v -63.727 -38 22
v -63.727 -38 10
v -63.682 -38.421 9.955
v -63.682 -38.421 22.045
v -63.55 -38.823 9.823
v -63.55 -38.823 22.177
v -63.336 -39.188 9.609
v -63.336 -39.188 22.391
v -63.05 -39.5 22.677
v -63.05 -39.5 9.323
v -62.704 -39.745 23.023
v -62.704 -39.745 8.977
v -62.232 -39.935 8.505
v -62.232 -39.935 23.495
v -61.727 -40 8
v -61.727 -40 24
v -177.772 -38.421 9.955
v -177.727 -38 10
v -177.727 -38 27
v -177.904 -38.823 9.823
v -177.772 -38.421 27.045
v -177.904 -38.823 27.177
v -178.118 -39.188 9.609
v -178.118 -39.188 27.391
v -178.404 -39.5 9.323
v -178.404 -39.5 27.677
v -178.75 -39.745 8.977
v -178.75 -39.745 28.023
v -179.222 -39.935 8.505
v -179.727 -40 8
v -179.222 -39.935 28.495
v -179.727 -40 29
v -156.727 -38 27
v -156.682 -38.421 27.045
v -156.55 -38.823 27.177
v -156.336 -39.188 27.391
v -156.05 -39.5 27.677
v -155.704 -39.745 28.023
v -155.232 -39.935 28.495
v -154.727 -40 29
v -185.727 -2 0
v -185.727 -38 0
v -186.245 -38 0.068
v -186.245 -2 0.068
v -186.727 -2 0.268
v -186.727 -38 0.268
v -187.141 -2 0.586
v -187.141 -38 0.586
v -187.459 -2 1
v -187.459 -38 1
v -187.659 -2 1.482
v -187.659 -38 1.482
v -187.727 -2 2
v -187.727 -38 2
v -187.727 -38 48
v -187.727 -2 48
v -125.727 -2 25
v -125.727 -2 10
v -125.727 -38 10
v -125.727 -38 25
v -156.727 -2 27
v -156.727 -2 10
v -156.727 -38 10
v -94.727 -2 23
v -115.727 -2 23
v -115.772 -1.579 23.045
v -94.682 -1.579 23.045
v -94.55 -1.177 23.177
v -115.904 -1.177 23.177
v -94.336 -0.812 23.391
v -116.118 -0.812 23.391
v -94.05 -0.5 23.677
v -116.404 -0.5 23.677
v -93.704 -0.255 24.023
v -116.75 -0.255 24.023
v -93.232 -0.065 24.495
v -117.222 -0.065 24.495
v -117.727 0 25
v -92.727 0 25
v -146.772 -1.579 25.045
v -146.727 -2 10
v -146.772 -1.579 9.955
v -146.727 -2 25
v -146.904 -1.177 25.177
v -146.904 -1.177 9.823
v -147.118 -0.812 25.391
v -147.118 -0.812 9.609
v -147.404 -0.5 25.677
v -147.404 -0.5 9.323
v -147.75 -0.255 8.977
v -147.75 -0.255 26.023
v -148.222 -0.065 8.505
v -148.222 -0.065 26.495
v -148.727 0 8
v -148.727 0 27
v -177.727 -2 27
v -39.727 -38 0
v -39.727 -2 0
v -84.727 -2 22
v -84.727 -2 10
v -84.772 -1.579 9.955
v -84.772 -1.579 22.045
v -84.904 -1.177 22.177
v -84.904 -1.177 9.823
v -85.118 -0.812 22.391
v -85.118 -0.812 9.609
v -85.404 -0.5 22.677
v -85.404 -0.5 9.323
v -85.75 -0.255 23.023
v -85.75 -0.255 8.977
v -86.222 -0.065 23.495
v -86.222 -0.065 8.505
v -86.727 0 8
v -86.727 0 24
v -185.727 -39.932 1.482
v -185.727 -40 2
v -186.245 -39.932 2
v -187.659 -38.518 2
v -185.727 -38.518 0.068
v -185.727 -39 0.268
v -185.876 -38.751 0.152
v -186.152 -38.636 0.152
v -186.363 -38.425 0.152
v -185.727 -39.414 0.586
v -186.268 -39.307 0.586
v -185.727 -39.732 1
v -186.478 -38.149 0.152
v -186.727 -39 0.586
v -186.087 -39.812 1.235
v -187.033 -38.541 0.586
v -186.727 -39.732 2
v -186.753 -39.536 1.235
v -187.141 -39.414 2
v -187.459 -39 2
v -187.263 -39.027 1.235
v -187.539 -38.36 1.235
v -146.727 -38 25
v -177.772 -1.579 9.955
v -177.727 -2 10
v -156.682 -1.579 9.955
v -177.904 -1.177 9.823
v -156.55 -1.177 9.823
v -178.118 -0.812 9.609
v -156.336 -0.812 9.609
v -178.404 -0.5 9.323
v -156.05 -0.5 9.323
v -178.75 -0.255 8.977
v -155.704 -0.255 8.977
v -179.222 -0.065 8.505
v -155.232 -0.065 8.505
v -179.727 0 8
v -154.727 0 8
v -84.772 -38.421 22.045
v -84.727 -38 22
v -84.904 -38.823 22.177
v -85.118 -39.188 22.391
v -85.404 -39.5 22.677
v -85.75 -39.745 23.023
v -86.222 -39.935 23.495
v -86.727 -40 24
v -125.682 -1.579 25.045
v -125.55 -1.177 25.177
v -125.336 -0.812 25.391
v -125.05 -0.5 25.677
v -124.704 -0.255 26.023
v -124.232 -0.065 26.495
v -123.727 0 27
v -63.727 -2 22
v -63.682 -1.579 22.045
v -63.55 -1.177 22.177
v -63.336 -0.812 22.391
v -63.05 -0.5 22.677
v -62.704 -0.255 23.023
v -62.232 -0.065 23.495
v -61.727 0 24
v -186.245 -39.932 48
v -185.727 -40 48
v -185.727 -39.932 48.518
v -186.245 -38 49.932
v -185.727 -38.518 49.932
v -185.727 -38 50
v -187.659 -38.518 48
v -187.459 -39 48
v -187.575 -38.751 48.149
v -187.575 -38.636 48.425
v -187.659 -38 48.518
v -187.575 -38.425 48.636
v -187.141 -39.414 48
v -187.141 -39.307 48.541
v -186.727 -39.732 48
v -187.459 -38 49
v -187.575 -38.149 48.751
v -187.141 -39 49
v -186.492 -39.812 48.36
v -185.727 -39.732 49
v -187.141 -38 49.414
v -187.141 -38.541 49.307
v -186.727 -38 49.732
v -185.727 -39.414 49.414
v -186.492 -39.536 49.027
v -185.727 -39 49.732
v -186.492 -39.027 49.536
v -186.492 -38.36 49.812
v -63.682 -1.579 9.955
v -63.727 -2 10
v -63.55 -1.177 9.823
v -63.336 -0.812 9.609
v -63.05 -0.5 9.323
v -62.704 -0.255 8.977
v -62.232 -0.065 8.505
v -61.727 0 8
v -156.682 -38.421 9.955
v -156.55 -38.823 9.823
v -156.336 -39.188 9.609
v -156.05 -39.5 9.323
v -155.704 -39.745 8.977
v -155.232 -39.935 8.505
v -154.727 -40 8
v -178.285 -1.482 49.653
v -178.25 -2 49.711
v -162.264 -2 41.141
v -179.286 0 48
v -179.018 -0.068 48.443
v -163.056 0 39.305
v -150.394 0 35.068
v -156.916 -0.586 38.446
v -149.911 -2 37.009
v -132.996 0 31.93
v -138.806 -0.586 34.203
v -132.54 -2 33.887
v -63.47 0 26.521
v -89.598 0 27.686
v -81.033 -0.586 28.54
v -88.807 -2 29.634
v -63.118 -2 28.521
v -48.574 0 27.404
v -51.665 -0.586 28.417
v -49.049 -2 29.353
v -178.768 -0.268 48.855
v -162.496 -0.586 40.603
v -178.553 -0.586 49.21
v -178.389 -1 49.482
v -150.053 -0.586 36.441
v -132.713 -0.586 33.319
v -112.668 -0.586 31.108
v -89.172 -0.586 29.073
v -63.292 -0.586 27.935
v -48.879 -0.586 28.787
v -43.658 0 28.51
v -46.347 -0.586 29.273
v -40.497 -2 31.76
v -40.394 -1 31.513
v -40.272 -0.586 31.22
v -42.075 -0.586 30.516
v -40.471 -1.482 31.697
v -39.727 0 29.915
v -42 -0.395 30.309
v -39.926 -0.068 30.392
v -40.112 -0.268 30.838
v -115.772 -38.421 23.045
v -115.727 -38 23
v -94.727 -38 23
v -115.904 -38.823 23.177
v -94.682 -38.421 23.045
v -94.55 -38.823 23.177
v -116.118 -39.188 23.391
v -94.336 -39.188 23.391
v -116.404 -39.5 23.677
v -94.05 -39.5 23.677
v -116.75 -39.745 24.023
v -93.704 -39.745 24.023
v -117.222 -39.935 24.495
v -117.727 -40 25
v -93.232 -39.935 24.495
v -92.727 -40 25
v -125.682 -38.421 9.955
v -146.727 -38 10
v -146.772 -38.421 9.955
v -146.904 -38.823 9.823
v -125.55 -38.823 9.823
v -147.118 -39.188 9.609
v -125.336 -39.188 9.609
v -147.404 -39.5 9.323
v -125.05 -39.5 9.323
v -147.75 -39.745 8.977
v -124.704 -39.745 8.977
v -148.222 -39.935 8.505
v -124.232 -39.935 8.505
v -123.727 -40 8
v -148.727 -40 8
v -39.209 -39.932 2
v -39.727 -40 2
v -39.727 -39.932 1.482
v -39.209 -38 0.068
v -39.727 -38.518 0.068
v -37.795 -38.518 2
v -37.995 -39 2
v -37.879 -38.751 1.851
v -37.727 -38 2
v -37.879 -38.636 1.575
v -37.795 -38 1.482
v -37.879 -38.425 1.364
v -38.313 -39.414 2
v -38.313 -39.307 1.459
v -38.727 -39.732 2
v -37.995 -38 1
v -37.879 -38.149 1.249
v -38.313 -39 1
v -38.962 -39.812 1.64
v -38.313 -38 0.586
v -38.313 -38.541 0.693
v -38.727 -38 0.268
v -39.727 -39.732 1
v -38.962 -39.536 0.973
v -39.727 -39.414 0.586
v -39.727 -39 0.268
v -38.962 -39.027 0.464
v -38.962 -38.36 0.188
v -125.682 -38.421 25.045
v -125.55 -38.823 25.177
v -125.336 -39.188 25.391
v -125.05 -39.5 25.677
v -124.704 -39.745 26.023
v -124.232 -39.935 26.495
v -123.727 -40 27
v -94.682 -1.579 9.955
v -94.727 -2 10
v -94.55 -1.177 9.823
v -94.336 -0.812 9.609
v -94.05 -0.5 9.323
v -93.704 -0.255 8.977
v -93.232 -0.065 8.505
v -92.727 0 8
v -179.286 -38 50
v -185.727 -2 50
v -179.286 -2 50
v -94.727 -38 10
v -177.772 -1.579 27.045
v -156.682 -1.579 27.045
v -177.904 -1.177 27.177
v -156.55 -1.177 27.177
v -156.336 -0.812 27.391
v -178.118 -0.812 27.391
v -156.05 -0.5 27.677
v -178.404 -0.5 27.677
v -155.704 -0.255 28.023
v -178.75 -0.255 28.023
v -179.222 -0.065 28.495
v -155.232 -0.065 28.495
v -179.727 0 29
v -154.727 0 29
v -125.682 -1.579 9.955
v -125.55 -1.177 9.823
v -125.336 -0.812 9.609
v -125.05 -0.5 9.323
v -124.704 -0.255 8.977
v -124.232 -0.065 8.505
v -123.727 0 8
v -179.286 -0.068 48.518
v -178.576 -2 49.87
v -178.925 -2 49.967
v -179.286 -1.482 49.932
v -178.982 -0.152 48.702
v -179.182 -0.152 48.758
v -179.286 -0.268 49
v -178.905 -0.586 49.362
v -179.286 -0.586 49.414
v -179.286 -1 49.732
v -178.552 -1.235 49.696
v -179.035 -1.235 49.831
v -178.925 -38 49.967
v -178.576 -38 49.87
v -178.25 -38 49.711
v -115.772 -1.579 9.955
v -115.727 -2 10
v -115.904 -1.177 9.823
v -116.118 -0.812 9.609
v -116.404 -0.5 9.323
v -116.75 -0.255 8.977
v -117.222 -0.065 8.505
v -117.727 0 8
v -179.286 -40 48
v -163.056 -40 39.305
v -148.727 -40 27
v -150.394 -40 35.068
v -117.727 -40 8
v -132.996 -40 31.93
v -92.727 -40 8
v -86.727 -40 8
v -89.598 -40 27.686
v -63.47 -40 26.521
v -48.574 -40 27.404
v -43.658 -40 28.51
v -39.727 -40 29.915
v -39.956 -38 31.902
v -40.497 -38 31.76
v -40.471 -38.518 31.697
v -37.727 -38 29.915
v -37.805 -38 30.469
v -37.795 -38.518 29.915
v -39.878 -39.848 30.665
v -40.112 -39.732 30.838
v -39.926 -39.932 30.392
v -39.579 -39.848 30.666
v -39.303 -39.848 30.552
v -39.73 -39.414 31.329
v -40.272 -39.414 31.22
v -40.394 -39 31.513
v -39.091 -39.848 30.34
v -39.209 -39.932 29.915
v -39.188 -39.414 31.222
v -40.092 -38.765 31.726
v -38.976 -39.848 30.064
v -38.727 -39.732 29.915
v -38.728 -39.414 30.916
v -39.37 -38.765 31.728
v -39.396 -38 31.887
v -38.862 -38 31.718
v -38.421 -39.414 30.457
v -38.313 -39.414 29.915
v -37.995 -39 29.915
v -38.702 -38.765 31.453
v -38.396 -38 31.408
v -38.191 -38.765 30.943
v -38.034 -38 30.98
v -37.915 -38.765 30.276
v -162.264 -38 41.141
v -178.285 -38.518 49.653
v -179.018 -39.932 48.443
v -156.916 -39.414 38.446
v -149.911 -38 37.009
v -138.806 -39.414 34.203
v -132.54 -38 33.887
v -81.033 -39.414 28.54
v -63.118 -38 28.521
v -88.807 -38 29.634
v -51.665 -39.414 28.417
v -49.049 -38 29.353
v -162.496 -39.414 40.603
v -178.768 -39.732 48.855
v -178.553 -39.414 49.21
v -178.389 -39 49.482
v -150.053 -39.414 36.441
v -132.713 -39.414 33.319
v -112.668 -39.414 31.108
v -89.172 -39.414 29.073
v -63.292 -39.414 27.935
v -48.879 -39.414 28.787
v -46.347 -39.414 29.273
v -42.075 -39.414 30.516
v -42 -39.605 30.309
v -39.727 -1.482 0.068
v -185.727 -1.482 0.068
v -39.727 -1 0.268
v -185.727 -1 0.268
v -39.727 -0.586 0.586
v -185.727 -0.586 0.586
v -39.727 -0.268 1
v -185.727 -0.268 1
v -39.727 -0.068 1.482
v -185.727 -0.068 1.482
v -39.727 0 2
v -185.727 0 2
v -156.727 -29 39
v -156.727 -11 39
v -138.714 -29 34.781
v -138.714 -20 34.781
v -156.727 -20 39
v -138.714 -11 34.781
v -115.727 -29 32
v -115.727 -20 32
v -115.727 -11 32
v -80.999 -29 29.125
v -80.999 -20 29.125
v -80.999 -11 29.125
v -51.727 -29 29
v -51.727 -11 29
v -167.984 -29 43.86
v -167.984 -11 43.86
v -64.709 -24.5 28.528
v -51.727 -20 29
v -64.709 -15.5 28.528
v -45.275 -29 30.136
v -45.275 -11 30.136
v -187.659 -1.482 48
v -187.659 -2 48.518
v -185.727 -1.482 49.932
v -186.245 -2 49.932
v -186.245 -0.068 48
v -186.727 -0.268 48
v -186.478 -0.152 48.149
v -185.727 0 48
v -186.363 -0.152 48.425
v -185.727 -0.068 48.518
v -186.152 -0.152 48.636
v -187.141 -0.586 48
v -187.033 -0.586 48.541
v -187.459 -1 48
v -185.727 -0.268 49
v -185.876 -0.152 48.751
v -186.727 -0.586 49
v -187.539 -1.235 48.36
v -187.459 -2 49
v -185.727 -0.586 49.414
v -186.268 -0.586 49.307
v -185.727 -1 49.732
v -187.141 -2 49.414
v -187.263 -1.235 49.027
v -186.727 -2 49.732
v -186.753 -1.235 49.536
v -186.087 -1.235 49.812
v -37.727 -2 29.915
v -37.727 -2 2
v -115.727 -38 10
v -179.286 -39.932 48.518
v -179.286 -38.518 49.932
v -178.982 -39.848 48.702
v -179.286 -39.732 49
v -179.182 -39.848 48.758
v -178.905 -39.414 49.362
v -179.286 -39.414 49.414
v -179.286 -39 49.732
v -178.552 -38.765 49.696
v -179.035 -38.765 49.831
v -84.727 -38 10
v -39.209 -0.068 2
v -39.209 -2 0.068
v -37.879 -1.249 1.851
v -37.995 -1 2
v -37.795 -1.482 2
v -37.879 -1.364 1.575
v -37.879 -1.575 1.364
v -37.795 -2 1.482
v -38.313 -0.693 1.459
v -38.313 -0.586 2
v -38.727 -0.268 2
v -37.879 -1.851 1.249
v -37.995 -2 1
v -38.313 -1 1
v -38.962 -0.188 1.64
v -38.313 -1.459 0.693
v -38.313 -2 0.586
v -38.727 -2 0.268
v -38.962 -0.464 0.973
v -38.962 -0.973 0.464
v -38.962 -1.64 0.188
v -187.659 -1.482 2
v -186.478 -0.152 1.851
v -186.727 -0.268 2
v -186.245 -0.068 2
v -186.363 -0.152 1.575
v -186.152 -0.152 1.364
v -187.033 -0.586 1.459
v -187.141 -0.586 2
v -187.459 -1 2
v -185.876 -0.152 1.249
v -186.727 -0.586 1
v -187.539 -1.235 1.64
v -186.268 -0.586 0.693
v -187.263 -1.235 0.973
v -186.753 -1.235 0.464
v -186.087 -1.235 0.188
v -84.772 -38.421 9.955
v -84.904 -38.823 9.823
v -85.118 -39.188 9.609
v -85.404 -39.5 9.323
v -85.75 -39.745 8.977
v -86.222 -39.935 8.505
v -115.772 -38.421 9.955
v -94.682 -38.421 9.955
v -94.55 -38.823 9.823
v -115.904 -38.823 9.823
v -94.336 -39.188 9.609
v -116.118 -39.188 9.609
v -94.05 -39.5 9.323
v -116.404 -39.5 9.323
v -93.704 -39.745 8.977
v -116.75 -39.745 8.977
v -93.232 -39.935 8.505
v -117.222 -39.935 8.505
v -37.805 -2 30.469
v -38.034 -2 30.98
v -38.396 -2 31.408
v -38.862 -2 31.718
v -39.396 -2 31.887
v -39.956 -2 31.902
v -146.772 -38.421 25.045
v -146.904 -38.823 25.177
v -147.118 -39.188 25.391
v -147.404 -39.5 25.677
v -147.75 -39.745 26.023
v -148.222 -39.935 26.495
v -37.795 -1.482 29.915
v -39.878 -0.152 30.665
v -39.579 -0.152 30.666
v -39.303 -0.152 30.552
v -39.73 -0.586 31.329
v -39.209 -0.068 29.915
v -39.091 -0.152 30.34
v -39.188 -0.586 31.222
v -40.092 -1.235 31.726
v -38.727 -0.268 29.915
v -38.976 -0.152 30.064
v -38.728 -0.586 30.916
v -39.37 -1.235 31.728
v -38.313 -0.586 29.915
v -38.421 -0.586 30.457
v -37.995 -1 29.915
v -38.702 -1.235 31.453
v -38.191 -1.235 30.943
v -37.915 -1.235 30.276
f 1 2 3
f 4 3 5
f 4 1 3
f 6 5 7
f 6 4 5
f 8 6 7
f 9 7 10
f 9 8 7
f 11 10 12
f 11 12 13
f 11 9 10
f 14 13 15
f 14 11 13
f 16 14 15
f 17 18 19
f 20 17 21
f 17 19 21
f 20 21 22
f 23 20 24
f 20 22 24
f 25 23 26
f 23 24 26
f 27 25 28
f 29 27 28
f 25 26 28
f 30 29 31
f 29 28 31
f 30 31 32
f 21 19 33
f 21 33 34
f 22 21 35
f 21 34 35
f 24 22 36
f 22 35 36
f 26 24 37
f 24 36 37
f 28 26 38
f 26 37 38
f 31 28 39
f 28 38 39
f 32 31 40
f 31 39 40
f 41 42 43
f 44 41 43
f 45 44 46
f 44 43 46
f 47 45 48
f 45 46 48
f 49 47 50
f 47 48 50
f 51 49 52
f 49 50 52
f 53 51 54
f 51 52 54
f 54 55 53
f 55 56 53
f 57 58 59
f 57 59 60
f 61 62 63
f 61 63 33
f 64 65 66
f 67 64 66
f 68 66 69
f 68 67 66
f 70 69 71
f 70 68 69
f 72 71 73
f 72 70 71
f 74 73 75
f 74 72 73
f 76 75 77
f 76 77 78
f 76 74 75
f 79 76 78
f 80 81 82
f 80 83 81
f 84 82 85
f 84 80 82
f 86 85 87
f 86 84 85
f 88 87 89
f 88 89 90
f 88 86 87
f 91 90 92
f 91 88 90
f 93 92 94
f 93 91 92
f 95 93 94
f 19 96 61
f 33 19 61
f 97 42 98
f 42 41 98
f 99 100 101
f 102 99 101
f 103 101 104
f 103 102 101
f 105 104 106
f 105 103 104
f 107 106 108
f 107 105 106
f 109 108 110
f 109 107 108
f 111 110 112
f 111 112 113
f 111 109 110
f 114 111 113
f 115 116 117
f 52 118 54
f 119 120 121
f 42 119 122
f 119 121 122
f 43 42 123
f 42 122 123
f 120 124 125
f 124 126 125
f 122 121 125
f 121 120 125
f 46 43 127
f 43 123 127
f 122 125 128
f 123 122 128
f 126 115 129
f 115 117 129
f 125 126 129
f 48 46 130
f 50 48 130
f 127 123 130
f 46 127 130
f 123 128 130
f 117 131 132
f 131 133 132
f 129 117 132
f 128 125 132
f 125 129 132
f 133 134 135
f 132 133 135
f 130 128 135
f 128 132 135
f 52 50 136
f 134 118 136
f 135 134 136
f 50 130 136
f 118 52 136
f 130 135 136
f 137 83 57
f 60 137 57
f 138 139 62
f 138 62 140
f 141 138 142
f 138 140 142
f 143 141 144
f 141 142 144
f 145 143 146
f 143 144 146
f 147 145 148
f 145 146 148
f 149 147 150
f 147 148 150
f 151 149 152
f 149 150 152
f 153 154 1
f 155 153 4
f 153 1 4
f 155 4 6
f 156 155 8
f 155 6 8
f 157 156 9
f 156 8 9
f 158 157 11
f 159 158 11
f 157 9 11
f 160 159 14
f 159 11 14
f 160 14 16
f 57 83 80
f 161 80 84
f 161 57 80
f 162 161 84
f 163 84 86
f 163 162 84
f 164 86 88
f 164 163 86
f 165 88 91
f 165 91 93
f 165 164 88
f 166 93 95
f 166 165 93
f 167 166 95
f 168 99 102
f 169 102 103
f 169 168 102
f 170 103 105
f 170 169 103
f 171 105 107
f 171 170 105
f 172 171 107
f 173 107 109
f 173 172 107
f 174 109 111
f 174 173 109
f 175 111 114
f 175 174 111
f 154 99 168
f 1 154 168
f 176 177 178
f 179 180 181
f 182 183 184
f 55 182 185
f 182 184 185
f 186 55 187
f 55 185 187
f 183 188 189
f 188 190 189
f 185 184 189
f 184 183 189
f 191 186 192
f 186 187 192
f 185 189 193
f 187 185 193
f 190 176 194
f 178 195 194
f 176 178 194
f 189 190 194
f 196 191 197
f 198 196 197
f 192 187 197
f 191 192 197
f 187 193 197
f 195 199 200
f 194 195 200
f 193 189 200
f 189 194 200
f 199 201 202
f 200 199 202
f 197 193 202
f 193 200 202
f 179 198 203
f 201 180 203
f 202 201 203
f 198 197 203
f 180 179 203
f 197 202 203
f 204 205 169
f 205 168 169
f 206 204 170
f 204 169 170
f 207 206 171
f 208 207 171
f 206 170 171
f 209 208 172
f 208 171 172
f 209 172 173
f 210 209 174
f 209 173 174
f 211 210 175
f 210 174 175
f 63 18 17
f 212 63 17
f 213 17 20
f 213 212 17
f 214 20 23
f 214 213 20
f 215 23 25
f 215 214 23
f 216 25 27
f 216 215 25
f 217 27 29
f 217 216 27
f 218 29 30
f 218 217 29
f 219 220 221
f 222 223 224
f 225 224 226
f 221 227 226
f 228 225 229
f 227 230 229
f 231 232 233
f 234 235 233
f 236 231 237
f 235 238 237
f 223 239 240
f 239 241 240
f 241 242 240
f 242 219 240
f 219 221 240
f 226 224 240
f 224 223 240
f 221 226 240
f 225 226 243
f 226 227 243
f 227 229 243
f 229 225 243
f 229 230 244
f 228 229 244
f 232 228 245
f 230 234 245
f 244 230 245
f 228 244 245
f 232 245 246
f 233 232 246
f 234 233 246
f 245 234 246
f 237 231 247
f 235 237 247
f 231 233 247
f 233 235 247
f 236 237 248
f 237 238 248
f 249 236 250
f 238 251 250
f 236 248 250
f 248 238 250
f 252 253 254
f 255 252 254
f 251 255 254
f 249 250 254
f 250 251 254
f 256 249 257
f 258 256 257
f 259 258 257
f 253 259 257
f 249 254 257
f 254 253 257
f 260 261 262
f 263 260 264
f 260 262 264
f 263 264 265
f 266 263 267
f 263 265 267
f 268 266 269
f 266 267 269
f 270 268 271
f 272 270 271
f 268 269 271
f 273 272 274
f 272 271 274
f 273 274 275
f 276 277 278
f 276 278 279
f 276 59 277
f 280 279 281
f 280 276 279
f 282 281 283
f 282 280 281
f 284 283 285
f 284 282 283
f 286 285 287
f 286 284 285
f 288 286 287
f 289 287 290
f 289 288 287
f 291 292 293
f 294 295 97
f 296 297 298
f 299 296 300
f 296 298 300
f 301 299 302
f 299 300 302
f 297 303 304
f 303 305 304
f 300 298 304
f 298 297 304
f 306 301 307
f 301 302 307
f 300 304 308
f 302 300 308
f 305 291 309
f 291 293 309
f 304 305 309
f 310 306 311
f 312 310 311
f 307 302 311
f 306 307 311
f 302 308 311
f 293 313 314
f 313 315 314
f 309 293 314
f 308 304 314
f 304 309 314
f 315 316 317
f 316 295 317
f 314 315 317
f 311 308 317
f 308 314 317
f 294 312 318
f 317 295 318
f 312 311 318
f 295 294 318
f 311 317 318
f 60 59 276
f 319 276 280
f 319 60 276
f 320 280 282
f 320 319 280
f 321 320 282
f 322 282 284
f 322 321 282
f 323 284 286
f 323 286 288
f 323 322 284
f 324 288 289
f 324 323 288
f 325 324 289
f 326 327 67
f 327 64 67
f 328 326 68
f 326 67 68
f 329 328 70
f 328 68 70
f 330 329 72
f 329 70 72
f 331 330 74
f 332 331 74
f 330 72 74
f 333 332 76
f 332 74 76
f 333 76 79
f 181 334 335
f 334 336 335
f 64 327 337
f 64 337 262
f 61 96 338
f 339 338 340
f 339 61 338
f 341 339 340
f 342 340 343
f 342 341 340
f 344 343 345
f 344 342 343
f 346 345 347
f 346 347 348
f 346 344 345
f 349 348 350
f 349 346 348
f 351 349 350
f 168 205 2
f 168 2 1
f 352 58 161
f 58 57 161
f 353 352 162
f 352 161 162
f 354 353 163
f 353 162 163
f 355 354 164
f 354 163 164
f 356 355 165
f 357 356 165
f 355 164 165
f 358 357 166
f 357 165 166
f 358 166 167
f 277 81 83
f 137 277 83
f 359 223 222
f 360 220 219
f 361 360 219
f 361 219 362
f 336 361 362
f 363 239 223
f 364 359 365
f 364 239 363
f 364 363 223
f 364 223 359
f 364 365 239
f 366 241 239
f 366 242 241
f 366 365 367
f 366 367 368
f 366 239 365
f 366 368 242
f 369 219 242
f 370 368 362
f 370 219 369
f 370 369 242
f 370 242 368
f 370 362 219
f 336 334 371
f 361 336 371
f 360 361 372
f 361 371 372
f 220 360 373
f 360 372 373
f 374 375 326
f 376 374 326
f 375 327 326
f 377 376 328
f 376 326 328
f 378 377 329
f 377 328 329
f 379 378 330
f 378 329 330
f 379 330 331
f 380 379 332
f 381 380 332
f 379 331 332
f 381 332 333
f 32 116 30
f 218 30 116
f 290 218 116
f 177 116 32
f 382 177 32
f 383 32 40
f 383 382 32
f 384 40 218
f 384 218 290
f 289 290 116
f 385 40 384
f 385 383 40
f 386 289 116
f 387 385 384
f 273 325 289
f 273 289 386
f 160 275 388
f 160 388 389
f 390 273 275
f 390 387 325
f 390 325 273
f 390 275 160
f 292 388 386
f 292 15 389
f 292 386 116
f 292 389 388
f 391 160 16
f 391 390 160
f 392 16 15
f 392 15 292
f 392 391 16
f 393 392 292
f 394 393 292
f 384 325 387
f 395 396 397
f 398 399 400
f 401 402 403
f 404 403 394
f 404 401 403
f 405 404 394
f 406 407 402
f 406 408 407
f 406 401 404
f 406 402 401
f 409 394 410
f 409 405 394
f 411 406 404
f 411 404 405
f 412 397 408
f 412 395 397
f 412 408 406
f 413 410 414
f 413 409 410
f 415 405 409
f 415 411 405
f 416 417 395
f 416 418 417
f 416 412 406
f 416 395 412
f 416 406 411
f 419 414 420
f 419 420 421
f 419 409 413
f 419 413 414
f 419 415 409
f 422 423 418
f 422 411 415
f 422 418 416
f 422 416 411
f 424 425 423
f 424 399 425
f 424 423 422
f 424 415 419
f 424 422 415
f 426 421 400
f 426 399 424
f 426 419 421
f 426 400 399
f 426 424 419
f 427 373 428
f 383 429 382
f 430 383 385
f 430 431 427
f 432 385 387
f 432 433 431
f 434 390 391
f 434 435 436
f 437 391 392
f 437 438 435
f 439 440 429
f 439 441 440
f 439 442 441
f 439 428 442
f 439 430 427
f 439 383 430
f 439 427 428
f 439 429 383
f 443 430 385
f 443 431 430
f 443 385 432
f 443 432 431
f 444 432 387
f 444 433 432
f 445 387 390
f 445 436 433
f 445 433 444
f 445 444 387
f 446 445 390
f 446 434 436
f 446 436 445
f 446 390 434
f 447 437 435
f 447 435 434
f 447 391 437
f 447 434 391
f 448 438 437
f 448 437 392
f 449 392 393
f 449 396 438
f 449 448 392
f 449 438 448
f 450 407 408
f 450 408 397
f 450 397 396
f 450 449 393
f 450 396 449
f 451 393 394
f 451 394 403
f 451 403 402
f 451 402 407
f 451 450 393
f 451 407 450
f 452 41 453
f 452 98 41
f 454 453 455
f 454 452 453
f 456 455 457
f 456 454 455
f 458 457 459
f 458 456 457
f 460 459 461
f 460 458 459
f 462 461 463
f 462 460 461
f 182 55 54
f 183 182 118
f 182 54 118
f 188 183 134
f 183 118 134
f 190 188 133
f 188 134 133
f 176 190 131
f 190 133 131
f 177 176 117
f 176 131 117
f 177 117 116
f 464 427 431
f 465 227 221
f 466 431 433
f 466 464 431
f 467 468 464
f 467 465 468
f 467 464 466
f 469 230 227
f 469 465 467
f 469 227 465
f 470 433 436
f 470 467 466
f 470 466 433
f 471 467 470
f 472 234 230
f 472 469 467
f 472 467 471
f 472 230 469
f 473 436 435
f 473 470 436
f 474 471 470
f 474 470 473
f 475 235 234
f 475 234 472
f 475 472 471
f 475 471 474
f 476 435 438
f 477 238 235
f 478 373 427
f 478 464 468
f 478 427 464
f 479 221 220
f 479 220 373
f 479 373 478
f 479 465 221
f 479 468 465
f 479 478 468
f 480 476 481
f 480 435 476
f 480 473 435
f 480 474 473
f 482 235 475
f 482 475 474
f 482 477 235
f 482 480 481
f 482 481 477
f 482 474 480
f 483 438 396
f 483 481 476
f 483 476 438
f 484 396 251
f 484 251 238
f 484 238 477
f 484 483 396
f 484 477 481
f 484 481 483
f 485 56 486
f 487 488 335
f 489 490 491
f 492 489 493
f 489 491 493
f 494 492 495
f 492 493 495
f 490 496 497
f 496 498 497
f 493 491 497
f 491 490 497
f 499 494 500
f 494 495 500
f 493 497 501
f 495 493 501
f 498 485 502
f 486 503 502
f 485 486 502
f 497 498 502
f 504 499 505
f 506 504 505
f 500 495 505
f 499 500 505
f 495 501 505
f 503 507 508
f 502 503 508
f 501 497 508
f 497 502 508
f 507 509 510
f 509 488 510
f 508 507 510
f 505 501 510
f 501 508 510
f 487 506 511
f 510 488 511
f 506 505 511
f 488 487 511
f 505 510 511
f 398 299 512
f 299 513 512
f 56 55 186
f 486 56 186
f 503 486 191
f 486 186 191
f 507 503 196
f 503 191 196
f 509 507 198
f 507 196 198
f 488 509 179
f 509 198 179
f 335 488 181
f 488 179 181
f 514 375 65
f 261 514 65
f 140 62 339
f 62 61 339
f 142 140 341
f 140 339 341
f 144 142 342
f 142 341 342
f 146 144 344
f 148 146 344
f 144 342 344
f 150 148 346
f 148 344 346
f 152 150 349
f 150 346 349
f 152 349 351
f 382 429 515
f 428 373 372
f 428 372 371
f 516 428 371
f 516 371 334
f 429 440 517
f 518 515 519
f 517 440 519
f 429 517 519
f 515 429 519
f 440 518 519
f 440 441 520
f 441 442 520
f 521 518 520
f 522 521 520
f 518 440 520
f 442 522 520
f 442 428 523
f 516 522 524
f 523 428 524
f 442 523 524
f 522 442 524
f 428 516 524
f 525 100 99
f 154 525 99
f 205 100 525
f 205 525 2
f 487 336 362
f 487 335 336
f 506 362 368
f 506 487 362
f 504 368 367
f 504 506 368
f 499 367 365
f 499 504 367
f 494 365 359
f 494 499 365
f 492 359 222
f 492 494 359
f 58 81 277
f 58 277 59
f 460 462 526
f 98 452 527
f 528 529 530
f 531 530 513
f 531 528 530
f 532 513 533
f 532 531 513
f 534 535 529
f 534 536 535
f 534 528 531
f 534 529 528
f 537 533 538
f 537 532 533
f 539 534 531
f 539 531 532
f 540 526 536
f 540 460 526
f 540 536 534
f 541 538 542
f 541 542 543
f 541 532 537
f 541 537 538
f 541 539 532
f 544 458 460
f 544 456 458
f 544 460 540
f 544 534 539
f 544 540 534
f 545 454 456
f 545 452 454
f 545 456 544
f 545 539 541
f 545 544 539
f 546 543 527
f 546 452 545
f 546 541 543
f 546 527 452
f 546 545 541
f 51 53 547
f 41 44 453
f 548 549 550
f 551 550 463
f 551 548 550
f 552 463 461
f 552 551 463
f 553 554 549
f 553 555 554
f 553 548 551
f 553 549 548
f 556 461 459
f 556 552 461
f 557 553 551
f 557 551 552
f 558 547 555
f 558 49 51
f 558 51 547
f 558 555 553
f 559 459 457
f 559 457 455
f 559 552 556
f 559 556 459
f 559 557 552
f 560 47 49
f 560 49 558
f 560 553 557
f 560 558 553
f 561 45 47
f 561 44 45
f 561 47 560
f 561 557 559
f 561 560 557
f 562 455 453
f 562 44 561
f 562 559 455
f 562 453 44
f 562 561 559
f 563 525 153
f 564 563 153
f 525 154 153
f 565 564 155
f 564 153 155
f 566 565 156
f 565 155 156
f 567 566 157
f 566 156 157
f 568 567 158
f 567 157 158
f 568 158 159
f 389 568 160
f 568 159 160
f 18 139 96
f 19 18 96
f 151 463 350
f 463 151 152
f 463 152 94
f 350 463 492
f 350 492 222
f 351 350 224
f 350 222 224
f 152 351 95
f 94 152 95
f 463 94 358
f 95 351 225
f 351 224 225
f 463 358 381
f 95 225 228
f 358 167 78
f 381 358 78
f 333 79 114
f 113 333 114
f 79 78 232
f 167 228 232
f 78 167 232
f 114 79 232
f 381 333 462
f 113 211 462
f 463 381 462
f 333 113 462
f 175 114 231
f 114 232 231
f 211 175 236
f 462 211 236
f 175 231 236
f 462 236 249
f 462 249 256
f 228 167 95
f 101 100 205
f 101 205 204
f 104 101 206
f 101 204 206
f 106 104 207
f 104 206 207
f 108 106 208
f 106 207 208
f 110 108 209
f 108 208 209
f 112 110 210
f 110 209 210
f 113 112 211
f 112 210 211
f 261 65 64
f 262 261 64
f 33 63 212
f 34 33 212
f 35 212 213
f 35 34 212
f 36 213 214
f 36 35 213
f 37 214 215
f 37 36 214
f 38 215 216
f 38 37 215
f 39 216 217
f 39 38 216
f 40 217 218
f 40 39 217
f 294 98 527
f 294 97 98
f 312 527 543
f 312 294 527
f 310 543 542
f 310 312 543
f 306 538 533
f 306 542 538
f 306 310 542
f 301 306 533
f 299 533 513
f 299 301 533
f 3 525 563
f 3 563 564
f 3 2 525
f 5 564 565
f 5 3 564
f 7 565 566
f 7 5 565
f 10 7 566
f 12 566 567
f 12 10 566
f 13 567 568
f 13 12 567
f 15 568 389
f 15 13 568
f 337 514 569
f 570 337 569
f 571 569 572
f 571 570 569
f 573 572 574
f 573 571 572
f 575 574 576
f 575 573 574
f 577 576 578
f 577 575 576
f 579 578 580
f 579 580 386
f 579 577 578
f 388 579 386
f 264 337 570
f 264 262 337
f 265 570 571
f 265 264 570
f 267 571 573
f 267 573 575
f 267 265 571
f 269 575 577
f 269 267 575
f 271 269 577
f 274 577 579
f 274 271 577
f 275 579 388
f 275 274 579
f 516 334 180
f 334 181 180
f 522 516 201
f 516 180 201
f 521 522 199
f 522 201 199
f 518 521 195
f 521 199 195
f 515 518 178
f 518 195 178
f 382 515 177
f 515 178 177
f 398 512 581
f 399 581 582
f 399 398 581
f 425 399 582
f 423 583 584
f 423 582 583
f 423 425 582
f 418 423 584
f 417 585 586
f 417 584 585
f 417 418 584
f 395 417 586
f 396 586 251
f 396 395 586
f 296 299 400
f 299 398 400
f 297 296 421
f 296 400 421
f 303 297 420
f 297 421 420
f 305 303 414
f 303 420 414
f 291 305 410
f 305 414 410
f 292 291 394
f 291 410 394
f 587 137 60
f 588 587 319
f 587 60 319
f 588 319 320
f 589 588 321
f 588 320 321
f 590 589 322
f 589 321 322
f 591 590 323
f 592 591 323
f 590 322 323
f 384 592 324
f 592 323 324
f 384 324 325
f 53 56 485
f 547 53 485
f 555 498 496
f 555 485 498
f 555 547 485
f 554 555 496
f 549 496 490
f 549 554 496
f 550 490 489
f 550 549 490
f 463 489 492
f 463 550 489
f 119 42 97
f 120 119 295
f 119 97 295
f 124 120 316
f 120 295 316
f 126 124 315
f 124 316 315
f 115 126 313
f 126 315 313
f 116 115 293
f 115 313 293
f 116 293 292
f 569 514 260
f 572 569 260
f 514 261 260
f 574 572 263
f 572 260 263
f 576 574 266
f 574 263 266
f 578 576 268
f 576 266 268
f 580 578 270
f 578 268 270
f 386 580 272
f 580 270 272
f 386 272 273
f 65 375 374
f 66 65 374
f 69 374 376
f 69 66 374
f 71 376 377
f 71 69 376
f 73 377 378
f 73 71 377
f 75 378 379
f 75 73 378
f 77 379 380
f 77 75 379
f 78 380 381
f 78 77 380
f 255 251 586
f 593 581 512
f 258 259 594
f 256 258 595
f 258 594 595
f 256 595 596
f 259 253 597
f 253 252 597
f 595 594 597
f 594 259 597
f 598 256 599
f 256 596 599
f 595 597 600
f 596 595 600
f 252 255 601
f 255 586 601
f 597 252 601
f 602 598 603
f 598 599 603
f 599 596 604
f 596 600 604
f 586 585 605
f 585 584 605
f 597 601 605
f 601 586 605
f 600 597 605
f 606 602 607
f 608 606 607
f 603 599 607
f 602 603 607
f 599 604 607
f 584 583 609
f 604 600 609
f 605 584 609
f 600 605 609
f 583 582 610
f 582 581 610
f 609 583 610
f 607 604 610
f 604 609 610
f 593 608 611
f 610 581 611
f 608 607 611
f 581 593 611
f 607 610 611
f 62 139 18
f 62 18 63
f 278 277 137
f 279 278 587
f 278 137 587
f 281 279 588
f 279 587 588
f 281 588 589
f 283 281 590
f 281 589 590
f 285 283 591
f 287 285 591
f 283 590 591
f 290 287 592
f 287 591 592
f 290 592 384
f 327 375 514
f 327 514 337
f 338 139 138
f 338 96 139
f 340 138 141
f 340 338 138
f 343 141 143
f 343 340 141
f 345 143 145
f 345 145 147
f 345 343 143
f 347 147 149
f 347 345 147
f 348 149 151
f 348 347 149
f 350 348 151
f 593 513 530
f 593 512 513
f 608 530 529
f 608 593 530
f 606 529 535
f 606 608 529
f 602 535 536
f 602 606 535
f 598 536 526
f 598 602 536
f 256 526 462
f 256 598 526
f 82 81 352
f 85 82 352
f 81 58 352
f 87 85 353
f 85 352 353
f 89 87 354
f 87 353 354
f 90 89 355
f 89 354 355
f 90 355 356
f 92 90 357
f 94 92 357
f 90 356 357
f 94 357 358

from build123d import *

# Parameters (mm, degrees)
F0_W     = 21
F0_H     = 17
F0_H_2   = 15
F0_H_3   = 13
F0_H_4   = 12
F1_DEPTH = 40
F2_R     = 2


with BuildPart() as f1:
    # F0 (on Front) → F1 (new body)
    with BuildSketch(Plane.XZ):
        with BuildLine():
            Line((-187.7269284463, 10), (-187.7269284463, 0))
            Line((-187.7269284463, 0), (-177.7269284463, 0))
            Line((-177.7269284463, 0), (-156.7269284463, 0))
            Line((-156.7269284463, 0), (-146.7269284463, 0))
            Line((-146.7269284463, 0), (-125.7269284463, 0))
            Line((-125.7269284463, 0), (-115.7269284463, 0))
            Line((-115.7269284463, 0), (-94.7269284463, 0))
            Line((-94.7269284463, 0), (-84.7269284463, 0))
            Line((-84.7269284463, 0), (-63.7269284463, 0))
            Line((-63.7269284463, 0), (-51.7269284463, 0))
            Line((-51.7269284463, 0), (-37.7269284463, 0))
            Line((-37.7269284463, 0), (-37.7269284463, 33))
            add(Edge.make_bspline(
                [(-178.7269284463, 50), (-171.8501135131, 45.8291458601), (-155.9934821594, 36.5832092462), (-116.9716909033, 31.7407768444), (-52.5012909301, 26.3666718297), (-41.333494482, 31.3189487613), (-37.7269284463, 33)],
                knots=[0, 0, 0, 0, 0.2135053975, 0.491145081, 0.8357316178, 1, 1, 1, 1], degree=3))
            Line((-178.7269284463, 50), (-187.7269284463, 50))
            Line((-187.7269284463, 50), (-187.7269284463, 10))
        make_face()
        with Locations((-167.2269284463, 18.5)):
            Rectangle(F0_W, F0_H, mode=Mode.SUBTRACT)
        with Locations((-136.2269284463, 17.5)):
            Rectangle(F0_W, F0_H_2, mode=Mode.SUBTRACT)
        with Locations((-105.2269284463, 16.5)):
            Rectangle(F0_W, F0_H_3, mode=Mode.SUBTRACT)
        with Locations((-74.2269284463, 16)):
            Rectangle(F0_W, F0_H_4, mode=Mode.SUBTRACT)
    extrude(amount=F1_DEPTH)

    # F2
    f2_edges = [f1.edges().sort_by_distance(p)[0] for p in [
        (-109.525437, -40, 31.392581),
        (-183.226928, -40, 50),
        (-187.726928, -40, 25),
        (-112.726928, -40, 0),
        (-37.726928, -40, 16.5),
        (-167.226928, -40, 10),
        (-177.726928, -40, 18.5),
        (-167.226928, -40, 27),
        (-156.726928, -40, 18.5),
        (-136.226928, -40, 10),
        (-146.726928, -40, 17.5),
        (-136.226928, -40, 25),
        (-125.726928, -40, 17.5),
        (-105.226928, -40, 10),
        (-115.726928, -40, 16.5),
        (-105.226928, -40, 23),
        (-94.726928, -40, 16.5),
        (-74.226928, -40, 10),
        (-84.726928, -40, 16),
        (-74.226928, -40, 22),
        (-63.726928, -40, 16),
        (-37.726928, -20, 33),
        (-178.726928, -20, 50),
        (-109.525437, 0, 31.392581),
        (-187.726928, -20, 50),
        (-187.726928, -20, 0),
        (-187.726928, 0, 25),
        (-183.226928, 0, 50),
        (-112.726928, 0, 0),
        (-37.726928, 0, 16.5),
        (-167.226928, 0, 10),
        (-177.726928, 0, 18.5),
        (-167.226928, 0, 27),
        (-156.726928, 0, 18.5),
        (-136.226928, 0, 10),
        (-146.726928, 0, 17.5),
        (-136.226928, 0, 25),
        (-125.726928, 0, 17.5),
        (-105.226928, 0, 10),
        (-115.726928, 0, 16.5),
        (-105.226928, 0, 23),
        (-94.726928, 0, 16.5),
        (-74.226928, 0, 10),
        (-84.726928, 0, 16),
        (-74.226928, 0, 22),
        (-63.726928, 0, 16),
        (-37.726928, -20, 0),
    ]]
    fillet(f2_edges, radius=F2_R)


solid = f1.part
